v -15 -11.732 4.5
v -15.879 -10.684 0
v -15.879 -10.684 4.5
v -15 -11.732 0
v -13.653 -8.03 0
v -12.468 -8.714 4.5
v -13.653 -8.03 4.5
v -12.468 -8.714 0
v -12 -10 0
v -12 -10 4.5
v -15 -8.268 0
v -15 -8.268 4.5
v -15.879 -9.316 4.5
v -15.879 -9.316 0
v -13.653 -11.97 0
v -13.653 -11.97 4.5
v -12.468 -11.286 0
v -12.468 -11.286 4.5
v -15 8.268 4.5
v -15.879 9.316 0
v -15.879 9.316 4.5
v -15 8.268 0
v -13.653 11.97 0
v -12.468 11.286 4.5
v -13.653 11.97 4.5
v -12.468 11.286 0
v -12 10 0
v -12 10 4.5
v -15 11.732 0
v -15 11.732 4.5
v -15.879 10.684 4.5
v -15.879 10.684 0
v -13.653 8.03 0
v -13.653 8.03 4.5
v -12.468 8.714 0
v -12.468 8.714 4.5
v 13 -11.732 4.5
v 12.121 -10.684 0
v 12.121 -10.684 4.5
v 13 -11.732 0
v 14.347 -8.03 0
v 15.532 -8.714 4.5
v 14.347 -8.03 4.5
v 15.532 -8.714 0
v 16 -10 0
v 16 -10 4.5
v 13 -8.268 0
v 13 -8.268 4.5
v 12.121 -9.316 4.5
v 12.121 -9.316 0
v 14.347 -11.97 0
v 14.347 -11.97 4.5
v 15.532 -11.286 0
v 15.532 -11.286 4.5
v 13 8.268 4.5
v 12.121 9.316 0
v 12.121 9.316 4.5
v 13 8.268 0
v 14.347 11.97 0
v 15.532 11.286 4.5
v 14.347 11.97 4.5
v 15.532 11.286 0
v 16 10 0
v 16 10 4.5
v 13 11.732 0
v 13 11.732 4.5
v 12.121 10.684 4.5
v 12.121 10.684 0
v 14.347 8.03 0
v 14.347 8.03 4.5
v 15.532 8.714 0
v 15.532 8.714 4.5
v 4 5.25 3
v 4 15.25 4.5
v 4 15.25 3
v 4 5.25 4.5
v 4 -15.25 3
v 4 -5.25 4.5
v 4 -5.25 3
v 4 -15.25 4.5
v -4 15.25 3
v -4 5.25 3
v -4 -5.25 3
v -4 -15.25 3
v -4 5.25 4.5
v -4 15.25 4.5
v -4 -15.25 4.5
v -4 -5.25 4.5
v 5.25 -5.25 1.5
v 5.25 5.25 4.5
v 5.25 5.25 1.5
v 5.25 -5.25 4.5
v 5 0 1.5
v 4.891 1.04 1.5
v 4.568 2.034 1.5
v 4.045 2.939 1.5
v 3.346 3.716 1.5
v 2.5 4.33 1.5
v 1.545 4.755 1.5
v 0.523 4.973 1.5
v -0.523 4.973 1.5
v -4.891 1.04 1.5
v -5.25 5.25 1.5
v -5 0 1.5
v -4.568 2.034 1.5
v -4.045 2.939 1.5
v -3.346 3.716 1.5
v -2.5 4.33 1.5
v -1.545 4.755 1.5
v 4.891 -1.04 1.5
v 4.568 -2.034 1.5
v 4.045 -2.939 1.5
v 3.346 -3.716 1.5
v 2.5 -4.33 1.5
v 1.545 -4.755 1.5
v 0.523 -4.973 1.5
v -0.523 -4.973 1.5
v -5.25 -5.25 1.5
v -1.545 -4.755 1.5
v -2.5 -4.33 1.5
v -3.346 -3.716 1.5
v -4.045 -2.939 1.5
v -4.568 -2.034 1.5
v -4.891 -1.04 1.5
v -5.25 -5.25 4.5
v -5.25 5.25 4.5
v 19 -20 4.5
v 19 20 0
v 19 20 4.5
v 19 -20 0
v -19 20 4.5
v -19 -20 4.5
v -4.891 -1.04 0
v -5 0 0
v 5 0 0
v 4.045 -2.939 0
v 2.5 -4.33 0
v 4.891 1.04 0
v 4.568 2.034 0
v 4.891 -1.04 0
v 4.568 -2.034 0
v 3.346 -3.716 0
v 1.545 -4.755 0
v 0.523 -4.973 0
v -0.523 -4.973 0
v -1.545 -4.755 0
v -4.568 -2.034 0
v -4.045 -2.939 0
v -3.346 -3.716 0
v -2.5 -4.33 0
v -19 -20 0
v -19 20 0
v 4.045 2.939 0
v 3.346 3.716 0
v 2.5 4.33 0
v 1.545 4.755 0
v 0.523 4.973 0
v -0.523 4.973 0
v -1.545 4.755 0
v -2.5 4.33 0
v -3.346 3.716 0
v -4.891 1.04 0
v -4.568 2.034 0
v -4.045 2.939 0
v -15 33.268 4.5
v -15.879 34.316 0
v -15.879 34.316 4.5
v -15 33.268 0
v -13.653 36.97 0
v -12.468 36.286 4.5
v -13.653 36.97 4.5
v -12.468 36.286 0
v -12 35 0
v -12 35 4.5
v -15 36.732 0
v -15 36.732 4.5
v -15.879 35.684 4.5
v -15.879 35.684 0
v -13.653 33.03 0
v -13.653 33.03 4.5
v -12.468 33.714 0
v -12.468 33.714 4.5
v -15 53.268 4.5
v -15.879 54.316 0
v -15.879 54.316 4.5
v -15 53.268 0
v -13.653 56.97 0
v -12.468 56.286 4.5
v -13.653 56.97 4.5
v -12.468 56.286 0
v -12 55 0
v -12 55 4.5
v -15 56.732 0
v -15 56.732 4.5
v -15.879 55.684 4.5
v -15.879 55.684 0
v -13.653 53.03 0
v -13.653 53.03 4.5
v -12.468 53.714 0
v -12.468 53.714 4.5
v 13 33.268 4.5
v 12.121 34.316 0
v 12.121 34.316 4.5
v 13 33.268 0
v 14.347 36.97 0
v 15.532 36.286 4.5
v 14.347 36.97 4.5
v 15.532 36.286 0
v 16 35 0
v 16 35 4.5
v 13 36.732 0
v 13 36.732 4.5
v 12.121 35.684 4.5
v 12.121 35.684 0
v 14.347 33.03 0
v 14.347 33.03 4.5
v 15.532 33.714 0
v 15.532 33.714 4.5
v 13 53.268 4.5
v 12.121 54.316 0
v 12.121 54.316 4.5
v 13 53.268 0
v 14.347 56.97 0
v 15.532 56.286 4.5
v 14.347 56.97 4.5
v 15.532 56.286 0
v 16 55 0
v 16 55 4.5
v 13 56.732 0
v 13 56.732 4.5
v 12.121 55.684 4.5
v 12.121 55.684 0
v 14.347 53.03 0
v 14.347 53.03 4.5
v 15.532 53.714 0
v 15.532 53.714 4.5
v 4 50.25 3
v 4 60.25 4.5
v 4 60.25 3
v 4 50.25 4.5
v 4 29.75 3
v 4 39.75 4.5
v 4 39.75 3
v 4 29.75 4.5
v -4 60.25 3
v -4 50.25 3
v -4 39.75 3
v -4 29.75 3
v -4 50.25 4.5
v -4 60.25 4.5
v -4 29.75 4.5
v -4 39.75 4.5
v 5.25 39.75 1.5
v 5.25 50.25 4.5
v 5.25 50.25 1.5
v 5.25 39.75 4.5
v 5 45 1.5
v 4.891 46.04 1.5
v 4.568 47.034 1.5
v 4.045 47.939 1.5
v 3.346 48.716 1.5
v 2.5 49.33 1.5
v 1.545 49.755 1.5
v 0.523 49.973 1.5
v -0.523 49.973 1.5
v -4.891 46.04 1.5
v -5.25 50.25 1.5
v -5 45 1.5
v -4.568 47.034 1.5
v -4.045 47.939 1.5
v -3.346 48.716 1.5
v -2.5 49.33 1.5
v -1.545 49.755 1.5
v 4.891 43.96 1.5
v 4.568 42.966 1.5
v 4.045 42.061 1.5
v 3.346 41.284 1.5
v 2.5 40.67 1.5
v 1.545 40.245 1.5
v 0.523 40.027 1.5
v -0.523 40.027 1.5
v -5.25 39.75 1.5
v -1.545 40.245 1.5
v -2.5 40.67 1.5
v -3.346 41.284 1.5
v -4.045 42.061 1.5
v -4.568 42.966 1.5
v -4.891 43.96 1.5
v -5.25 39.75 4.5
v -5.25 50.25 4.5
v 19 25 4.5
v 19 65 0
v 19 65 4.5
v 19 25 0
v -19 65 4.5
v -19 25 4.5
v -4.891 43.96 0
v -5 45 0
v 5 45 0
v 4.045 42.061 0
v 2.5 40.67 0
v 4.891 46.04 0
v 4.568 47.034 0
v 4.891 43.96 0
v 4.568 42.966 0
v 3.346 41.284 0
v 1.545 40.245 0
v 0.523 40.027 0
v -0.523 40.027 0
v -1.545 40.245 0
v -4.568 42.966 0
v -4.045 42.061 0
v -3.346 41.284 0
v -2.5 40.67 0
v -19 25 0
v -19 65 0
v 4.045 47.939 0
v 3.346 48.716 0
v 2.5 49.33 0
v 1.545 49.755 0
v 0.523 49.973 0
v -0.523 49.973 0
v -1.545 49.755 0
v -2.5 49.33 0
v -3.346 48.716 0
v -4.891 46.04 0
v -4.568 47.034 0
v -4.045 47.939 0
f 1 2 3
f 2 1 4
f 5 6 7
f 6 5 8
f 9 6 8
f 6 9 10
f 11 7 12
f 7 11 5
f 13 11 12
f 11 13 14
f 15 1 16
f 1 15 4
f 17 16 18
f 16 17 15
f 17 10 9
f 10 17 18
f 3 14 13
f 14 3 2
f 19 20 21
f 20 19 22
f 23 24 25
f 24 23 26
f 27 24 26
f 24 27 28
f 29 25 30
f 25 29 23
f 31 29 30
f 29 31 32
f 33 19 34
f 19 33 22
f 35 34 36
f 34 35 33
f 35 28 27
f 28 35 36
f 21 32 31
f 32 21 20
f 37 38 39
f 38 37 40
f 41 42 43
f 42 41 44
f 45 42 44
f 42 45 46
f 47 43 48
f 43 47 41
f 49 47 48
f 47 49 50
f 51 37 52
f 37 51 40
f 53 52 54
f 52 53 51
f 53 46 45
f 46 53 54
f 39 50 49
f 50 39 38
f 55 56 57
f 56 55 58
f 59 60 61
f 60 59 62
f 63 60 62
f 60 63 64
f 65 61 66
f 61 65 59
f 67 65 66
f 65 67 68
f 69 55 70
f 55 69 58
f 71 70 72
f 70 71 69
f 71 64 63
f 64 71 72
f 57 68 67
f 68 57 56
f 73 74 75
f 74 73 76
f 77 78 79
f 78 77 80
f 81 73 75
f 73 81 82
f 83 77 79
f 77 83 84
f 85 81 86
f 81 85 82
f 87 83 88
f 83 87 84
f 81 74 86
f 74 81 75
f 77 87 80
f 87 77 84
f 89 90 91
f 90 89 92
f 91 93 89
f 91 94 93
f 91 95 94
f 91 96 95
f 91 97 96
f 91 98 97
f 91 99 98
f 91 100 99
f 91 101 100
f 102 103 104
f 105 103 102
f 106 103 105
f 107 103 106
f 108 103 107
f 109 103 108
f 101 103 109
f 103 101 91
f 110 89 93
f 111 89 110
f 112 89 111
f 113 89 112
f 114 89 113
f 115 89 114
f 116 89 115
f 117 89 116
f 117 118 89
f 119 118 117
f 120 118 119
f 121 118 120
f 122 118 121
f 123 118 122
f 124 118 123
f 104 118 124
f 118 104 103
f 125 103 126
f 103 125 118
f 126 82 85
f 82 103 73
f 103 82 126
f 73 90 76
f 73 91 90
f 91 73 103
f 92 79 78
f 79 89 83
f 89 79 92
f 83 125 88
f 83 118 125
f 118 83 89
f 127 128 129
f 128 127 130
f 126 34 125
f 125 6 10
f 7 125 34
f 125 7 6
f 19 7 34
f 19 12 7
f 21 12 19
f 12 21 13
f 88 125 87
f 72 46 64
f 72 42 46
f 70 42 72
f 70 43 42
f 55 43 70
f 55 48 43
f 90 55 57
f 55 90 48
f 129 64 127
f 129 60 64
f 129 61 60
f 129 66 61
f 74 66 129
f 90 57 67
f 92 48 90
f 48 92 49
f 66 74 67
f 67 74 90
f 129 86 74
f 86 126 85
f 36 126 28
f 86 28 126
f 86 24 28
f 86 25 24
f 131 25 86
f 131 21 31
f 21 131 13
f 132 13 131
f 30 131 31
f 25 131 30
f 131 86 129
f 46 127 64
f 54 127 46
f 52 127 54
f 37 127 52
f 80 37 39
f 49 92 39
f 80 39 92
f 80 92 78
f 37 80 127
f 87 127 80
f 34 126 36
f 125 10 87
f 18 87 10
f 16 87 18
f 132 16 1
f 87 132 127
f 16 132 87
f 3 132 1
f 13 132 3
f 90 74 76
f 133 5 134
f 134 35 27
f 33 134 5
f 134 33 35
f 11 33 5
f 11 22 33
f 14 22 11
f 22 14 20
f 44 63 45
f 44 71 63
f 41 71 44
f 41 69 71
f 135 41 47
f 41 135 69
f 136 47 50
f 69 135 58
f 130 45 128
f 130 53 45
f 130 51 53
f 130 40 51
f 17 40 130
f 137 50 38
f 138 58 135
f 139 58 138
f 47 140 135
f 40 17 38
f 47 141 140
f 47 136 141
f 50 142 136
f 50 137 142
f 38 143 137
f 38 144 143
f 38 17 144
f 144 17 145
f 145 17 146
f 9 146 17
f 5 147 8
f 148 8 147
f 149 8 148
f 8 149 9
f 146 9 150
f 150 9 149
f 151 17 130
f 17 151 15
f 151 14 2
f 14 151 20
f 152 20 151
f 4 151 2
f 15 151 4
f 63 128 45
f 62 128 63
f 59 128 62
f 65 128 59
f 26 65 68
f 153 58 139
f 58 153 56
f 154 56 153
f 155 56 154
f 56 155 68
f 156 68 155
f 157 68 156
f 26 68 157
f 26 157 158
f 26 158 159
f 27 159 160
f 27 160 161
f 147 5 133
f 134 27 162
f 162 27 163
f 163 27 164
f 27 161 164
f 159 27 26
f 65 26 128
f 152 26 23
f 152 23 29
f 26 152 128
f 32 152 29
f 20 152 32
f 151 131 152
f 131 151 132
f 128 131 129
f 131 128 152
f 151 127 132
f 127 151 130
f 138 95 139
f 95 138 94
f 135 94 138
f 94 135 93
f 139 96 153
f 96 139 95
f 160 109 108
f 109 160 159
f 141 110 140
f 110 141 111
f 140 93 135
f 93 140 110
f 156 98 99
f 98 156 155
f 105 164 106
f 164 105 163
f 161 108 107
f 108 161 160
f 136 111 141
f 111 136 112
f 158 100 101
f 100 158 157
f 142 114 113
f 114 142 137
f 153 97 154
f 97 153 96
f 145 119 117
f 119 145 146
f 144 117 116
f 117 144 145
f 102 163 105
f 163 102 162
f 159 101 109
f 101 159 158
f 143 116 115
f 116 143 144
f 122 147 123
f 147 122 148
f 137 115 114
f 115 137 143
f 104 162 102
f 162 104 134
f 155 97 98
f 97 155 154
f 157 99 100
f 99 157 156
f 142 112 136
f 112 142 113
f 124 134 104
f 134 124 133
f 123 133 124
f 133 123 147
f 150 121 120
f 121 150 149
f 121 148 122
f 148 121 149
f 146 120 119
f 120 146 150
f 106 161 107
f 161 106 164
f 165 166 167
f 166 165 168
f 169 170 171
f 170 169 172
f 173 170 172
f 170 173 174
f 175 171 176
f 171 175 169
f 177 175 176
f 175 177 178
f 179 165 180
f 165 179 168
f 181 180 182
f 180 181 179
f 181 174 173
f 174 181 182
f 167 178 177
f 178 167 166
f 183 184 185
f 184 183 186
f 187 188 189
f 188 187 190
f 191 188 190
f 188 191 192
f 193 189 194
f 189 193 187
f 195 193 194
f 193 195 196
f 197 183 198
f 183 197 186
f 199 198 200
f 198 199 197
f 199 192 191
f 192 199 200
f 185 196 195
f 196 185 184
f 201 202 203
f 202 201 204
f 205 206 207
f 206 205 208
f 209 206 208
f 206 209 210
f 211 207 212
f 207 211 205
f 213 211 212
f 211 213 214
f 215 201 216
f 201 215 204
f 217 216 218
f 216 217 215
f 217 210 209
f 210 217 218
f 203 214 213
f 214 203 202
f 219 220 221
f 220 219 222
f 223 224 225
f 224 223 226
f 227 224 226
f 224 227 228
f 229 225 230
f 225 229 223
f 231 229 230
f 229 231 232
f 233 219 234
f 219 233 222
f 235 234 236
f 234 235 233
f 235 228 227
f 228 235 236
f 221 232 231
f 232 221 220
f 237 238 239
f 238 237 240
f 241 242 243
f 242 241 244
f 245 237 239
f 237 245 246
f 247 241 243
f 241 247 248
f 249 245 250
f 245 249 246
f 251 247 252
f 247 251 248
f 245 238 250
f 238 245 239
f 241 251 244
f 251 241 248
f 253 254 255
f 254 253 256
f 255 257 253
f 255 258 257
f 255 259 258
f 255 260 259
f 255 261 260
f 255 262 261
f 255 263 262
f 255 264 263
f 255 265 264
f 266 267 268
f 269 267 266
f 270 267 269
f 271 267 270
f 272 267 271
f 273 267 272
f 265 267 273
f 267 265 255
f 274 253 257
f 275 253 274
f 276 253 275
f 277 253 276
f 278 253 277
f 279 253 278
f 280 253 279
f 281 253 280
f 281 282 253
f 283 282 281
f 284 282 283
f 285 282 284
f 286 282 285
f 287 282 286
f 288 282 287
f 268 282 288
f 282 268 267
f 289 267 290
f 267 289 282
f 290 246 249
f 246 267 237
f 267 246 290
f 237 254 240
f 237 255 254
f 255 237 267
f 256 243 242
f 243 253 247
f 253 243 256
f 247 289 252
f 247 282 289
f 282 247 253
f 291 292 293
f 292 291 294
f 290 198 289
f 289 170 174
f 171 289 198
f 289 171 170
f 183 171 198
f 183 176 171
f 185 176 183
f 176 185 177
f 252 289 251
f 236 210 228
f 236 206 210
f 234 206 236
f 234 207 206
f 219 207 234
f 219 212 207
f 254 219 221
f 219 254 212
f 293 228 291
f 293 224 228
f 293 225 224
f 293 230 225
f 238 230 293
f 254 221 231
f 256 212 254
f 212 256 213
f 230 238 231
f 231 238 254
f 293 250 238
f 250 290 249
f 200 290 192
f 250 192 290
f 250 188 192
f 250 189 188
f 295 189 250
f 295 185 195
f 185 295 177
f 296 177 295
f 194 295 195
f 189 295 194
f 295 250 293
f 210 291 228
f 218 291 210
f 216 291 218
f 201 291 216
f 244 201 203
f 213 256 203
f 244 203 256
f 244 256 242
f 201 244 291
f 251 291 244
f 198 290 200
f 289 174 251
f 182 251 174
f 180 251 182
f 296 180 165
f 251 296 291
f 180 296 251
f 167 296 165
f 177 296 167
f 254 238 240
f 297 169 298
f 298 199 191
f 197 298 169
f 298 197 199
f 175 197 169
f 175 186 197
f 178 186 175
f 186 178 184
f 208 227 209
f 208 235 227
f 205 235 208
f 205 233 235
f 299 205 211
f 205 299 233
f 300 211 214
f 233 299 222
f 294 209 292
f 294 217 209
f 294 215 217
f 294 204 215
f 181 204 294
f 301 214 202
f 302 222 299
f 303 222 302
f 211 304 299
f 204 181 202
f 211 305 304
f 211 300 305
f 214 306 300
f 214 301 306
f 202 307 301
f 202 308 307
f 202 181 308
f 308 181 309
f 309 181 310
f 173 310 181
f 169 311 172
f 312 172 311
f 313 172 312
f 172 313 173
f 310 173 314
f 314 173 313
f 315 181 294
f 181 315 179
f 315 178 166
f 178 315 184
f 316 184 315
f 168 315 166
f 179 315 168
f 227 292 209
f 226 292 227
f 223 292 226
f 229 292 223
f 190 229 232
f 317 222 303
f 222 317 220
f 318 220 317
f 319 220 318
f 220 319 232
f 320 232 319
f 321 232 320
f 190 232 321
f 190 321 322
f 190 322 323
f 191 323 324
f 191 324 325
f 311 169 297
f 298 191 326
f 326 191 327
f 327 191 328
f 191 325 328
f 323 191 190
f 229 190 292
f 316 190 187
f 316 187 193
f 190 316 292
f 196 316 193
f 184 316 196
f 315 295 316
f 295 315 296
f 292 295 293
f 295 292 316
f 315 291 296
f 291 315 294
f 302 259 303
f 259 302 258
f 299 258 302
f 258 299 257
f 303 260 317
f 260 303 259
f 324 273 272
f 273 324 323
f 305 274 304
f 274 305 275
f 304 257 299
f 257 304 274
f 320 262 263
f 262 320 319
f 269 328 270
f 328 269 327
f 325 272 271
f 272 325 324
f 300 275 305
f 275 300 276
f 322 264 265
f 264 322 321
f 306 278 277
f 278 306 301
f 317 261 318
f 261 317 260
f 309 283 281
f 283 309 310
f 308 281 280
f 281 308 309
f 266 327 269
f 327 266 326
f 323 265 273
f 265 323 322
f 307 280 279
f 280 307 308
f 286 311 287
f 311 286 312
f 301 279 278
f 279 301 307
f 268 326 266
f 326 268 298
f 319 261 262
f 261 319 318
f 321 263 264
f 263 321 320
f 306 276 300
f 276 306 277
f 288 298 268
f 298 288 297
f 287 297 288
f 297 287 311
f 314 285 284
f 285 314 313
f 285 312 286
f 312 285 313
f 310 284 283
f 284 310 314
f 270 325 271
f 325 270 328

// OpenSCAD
module servoMountLock()
{
  space=[0.5, 0.5, 0.5];
  difference()
  {
    translate([-14-5, -10-10, 0])
      cube([2*(14+5), 2*(10+10), 4.5]);
    // screw holes
    for(dx = [-1, +1])
      for(dy = [-1, +1])
        translate([dx*14, dy*10, -2])
          cylinder(r=(3+1)/2, $fs=1.5, h=4.5+4);
    translate([0, 0, 1])
    {
      // main rod mounting hole
      translate([-(7.5+space[0])/2, -(30+space[1])/2, 4.5-(2+space[2])])
        cube([7.5, 30, 2] + space);
      // center, thicker part
      translate([-(10+space[0])/2, -(10+space[1])/2, 4.5-(3.5+space[2])])
        cube([10, 10, 3.5] + space);
    }
    // servo's screw space
    translate([0, 0, -1])
      cylinder(r=(9+1)/2, h=6, $fs=1);
  }
}

for(i=[0:1])
  translate([0, i*45, 0])
    servoMountLock();
